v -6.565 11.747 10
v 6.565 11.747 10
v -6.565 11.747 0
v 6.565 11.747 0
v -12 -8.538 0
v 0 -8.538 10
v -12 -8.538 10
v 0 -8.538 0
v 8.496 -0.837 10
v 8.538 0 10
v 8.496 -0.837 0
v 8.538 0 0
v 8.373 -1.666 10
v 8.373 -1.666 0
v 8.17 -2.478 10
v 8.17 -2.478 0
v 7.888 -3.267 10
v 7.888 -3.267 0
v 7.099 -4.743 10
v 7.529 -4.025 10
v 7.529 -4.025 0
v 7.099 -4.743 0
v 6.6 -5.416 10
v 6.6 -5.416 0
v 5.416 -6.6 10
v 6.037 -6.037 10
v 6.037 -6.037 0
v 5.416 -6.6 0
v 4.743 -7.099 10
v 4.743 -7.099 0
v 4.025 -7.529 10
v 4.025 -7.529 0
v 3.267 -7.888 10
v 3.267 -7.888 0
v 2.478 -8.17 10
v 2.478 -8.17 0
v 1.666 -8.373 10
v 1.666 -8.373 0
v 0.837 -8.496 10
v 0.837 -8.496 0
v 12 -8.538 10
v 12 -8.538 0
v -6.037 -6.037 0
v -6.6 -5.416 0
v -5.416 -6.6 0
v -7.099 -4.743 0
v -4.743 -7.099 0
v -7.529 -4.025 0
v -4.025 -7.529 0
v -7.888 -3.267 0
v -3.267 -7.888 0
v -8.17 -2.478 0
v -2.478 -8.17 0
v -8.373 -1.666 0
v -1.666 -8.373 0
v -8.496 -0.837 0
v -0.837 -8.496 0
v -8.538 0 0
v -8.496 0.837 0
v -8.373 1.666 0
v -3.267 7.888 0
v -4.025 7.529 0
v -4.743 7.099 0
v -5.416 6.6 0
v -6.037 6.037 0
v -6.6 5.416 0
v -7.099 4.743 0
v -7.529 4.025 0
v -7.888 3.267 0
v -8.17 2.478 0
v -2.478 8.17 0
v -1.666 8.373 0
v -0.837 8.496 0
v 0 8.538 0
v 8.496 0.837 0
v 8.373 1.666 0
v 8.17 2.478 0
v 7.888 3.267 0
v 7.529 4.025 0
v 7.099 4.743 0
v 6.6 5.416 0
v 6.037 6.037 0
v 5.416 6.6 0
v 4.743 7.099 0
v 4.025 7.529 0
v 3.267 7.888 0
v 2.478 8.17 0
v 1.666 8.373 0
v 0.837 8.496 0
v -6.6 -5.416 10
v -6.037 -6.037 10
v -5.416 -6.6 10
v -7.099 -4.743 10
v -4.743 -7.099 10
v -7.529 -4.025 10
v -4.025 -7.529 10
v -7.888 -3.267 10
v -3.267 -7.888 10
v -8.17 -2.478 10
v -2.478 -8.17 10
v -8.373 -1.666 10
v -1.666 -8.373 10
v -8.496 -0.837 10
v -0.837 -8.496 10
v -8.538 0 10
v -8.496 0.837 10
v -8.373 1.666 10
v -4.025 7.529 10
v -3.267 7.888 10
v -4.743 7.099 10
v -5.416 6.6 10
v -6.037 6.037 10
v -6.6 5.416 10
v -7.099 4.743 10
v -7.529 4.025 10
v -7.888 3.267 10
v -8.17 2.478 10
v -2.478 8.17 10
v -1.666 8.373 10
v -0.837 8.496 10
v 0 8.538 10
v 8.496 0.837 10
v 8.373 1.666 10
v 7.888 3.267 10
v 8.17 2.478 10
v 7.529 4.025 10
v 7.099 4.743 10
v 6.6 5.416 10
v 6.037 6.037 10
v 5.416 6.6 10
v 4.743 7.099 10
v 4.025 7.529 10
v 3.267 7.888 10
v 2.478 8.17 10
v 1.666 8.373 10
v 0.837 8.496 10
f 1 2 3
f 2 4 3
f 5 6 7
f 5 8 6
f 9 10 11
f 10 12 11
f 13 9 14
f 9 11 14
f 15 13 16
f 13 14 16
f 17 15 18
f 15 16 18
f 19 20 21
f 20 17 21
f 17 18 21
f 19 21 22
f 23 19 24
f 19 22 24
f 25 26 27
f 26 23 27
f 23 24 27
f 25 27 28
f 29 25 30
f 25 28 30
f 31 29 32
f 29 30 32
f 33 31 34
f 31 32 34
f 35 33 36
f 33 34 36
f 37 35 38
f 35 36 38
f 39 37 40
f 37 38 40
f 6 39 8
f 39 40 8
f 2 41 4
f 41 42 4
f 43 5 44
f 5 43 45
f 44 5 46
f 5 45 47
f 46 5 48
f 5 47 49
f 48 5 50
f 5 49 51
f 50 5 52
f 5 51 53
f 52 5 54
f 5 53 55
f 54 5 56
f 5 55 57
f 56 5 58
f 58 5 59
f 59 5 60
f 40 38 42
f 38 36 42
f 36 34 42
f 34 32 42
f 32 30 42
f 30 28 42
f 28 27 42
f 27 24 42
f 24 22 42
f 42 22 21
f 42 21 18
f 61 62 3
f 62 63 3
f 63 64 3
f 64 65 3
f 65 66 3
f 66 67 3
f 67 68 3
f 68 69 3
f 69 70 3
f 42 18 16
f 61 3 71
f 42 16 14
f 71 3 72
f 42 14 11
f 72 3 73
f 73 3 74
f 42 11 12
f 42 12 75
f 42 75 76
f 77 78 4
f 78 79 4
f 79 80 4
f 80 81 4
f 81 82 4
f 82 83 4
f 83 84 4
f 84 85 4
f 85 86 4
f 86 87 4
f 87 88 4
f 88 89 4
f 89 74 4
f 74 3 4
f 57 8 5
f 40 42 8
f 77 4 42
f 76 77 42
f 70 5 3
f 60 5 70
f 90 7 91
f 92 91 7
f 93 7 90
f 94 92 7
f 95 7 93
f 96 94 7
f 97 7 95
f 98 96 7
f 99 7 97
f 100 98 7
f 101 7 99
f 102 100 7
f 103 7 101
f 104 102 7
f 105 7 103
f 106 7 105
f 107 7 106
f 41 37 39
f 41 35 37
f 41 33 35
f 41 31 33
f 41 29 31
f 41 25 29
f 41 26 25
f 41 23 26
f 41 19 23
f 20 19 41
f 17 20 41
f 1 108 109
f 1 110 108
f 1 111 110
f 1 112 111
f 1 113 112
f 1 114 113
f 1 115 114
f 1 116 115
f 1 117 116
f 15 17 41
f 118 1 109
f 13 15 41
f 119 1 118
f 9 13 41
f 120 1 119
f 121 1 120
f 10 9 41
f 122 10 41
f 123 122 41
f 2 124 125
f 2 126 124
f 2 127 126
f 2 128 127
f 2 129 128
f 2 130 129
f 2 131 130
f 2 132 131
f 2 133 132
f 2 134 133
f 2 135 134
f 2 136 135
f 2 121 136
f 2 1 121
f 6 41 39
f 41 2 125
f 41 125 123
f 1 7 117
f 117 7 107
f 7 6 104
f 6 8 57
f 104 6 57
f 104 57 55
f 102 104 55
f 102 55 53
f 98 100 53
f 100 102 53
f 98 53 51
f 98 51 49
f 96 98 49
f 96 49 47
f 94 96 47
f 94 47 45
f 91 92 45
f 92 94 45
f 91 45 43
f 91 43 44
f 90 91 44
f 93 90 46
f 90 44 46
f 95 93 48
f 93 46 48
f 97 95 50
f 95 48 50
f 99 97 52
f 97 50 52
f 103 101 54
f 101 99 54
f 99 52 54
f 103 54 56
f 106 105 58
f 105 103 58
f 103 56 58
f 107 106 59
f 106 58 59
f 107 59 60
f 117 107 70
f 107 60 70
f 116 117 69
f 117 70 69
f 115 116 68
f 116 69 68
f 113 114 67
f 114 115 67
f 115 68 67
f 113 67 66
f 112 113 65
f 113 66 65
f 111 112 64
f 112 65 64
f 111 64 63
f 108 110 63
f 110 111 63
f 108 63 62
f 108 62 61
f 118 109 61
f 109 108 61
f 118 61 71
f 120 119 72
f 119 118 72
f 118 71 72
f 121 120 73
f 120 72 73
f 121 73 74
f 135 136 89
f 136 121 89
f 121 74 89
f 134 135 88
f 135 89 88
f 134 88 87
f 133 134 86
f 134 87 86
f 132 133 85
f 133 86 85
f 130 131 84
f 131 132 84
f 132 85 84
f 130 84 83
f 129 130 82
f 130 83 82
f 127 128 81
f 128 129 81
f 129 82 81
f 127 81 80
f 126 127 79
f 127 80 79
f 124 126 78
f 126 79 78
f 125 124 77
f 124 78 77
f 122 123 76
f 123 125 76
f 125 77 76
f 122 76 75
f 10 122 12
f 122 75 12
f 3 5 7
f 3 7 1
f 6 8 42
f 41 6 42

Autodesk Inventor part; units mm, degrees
ref_plane "YZ Plane" through (0, 0, 0) normal (1, 0, 0) x (0, 1, 0)
ref_plane "XZ Plane" through (0, 0, 0) normal (0, 1, 0) x (-1, 0, 0)
ref_plane "XY Plane" through (0, 0, 0) normal (0, 0, 1) x (1, 0, 0)
sketch "Sketch1" plane through (0, 0, 0) normal (0, 0, 1) x (1, 0, 0)
  circle A0 centre (0, 0) radius 8.5375
  line L0 (0, -8.5375) -> (12, -8.5375)
  line L1 (0, -8.5375) -> (-12, -8.5375)
  line L2 (-12, -8.5375) -> (-6.5648, 11.7469)
  line L3 (12, -8.5375) -> (6.5648, 11.7469)
  line L4 (12, -8.5375) -> (33, -8.5375) construction
  line L5 (6.5648, 11.7469) -> (-6.5648, 11.7469)
  dimension "d0" = 17.075
  dimension "d1" = 12
  dimension "d2" = 12
  dimension "d3" = 21
  dimension "d4" = 75
  dimension "d7" = 21
  dimension "d8" = 105
extrude "Extrusion1" add sketch "Sketch1" along normal blind 10
properties part number "parte ensamble in"
